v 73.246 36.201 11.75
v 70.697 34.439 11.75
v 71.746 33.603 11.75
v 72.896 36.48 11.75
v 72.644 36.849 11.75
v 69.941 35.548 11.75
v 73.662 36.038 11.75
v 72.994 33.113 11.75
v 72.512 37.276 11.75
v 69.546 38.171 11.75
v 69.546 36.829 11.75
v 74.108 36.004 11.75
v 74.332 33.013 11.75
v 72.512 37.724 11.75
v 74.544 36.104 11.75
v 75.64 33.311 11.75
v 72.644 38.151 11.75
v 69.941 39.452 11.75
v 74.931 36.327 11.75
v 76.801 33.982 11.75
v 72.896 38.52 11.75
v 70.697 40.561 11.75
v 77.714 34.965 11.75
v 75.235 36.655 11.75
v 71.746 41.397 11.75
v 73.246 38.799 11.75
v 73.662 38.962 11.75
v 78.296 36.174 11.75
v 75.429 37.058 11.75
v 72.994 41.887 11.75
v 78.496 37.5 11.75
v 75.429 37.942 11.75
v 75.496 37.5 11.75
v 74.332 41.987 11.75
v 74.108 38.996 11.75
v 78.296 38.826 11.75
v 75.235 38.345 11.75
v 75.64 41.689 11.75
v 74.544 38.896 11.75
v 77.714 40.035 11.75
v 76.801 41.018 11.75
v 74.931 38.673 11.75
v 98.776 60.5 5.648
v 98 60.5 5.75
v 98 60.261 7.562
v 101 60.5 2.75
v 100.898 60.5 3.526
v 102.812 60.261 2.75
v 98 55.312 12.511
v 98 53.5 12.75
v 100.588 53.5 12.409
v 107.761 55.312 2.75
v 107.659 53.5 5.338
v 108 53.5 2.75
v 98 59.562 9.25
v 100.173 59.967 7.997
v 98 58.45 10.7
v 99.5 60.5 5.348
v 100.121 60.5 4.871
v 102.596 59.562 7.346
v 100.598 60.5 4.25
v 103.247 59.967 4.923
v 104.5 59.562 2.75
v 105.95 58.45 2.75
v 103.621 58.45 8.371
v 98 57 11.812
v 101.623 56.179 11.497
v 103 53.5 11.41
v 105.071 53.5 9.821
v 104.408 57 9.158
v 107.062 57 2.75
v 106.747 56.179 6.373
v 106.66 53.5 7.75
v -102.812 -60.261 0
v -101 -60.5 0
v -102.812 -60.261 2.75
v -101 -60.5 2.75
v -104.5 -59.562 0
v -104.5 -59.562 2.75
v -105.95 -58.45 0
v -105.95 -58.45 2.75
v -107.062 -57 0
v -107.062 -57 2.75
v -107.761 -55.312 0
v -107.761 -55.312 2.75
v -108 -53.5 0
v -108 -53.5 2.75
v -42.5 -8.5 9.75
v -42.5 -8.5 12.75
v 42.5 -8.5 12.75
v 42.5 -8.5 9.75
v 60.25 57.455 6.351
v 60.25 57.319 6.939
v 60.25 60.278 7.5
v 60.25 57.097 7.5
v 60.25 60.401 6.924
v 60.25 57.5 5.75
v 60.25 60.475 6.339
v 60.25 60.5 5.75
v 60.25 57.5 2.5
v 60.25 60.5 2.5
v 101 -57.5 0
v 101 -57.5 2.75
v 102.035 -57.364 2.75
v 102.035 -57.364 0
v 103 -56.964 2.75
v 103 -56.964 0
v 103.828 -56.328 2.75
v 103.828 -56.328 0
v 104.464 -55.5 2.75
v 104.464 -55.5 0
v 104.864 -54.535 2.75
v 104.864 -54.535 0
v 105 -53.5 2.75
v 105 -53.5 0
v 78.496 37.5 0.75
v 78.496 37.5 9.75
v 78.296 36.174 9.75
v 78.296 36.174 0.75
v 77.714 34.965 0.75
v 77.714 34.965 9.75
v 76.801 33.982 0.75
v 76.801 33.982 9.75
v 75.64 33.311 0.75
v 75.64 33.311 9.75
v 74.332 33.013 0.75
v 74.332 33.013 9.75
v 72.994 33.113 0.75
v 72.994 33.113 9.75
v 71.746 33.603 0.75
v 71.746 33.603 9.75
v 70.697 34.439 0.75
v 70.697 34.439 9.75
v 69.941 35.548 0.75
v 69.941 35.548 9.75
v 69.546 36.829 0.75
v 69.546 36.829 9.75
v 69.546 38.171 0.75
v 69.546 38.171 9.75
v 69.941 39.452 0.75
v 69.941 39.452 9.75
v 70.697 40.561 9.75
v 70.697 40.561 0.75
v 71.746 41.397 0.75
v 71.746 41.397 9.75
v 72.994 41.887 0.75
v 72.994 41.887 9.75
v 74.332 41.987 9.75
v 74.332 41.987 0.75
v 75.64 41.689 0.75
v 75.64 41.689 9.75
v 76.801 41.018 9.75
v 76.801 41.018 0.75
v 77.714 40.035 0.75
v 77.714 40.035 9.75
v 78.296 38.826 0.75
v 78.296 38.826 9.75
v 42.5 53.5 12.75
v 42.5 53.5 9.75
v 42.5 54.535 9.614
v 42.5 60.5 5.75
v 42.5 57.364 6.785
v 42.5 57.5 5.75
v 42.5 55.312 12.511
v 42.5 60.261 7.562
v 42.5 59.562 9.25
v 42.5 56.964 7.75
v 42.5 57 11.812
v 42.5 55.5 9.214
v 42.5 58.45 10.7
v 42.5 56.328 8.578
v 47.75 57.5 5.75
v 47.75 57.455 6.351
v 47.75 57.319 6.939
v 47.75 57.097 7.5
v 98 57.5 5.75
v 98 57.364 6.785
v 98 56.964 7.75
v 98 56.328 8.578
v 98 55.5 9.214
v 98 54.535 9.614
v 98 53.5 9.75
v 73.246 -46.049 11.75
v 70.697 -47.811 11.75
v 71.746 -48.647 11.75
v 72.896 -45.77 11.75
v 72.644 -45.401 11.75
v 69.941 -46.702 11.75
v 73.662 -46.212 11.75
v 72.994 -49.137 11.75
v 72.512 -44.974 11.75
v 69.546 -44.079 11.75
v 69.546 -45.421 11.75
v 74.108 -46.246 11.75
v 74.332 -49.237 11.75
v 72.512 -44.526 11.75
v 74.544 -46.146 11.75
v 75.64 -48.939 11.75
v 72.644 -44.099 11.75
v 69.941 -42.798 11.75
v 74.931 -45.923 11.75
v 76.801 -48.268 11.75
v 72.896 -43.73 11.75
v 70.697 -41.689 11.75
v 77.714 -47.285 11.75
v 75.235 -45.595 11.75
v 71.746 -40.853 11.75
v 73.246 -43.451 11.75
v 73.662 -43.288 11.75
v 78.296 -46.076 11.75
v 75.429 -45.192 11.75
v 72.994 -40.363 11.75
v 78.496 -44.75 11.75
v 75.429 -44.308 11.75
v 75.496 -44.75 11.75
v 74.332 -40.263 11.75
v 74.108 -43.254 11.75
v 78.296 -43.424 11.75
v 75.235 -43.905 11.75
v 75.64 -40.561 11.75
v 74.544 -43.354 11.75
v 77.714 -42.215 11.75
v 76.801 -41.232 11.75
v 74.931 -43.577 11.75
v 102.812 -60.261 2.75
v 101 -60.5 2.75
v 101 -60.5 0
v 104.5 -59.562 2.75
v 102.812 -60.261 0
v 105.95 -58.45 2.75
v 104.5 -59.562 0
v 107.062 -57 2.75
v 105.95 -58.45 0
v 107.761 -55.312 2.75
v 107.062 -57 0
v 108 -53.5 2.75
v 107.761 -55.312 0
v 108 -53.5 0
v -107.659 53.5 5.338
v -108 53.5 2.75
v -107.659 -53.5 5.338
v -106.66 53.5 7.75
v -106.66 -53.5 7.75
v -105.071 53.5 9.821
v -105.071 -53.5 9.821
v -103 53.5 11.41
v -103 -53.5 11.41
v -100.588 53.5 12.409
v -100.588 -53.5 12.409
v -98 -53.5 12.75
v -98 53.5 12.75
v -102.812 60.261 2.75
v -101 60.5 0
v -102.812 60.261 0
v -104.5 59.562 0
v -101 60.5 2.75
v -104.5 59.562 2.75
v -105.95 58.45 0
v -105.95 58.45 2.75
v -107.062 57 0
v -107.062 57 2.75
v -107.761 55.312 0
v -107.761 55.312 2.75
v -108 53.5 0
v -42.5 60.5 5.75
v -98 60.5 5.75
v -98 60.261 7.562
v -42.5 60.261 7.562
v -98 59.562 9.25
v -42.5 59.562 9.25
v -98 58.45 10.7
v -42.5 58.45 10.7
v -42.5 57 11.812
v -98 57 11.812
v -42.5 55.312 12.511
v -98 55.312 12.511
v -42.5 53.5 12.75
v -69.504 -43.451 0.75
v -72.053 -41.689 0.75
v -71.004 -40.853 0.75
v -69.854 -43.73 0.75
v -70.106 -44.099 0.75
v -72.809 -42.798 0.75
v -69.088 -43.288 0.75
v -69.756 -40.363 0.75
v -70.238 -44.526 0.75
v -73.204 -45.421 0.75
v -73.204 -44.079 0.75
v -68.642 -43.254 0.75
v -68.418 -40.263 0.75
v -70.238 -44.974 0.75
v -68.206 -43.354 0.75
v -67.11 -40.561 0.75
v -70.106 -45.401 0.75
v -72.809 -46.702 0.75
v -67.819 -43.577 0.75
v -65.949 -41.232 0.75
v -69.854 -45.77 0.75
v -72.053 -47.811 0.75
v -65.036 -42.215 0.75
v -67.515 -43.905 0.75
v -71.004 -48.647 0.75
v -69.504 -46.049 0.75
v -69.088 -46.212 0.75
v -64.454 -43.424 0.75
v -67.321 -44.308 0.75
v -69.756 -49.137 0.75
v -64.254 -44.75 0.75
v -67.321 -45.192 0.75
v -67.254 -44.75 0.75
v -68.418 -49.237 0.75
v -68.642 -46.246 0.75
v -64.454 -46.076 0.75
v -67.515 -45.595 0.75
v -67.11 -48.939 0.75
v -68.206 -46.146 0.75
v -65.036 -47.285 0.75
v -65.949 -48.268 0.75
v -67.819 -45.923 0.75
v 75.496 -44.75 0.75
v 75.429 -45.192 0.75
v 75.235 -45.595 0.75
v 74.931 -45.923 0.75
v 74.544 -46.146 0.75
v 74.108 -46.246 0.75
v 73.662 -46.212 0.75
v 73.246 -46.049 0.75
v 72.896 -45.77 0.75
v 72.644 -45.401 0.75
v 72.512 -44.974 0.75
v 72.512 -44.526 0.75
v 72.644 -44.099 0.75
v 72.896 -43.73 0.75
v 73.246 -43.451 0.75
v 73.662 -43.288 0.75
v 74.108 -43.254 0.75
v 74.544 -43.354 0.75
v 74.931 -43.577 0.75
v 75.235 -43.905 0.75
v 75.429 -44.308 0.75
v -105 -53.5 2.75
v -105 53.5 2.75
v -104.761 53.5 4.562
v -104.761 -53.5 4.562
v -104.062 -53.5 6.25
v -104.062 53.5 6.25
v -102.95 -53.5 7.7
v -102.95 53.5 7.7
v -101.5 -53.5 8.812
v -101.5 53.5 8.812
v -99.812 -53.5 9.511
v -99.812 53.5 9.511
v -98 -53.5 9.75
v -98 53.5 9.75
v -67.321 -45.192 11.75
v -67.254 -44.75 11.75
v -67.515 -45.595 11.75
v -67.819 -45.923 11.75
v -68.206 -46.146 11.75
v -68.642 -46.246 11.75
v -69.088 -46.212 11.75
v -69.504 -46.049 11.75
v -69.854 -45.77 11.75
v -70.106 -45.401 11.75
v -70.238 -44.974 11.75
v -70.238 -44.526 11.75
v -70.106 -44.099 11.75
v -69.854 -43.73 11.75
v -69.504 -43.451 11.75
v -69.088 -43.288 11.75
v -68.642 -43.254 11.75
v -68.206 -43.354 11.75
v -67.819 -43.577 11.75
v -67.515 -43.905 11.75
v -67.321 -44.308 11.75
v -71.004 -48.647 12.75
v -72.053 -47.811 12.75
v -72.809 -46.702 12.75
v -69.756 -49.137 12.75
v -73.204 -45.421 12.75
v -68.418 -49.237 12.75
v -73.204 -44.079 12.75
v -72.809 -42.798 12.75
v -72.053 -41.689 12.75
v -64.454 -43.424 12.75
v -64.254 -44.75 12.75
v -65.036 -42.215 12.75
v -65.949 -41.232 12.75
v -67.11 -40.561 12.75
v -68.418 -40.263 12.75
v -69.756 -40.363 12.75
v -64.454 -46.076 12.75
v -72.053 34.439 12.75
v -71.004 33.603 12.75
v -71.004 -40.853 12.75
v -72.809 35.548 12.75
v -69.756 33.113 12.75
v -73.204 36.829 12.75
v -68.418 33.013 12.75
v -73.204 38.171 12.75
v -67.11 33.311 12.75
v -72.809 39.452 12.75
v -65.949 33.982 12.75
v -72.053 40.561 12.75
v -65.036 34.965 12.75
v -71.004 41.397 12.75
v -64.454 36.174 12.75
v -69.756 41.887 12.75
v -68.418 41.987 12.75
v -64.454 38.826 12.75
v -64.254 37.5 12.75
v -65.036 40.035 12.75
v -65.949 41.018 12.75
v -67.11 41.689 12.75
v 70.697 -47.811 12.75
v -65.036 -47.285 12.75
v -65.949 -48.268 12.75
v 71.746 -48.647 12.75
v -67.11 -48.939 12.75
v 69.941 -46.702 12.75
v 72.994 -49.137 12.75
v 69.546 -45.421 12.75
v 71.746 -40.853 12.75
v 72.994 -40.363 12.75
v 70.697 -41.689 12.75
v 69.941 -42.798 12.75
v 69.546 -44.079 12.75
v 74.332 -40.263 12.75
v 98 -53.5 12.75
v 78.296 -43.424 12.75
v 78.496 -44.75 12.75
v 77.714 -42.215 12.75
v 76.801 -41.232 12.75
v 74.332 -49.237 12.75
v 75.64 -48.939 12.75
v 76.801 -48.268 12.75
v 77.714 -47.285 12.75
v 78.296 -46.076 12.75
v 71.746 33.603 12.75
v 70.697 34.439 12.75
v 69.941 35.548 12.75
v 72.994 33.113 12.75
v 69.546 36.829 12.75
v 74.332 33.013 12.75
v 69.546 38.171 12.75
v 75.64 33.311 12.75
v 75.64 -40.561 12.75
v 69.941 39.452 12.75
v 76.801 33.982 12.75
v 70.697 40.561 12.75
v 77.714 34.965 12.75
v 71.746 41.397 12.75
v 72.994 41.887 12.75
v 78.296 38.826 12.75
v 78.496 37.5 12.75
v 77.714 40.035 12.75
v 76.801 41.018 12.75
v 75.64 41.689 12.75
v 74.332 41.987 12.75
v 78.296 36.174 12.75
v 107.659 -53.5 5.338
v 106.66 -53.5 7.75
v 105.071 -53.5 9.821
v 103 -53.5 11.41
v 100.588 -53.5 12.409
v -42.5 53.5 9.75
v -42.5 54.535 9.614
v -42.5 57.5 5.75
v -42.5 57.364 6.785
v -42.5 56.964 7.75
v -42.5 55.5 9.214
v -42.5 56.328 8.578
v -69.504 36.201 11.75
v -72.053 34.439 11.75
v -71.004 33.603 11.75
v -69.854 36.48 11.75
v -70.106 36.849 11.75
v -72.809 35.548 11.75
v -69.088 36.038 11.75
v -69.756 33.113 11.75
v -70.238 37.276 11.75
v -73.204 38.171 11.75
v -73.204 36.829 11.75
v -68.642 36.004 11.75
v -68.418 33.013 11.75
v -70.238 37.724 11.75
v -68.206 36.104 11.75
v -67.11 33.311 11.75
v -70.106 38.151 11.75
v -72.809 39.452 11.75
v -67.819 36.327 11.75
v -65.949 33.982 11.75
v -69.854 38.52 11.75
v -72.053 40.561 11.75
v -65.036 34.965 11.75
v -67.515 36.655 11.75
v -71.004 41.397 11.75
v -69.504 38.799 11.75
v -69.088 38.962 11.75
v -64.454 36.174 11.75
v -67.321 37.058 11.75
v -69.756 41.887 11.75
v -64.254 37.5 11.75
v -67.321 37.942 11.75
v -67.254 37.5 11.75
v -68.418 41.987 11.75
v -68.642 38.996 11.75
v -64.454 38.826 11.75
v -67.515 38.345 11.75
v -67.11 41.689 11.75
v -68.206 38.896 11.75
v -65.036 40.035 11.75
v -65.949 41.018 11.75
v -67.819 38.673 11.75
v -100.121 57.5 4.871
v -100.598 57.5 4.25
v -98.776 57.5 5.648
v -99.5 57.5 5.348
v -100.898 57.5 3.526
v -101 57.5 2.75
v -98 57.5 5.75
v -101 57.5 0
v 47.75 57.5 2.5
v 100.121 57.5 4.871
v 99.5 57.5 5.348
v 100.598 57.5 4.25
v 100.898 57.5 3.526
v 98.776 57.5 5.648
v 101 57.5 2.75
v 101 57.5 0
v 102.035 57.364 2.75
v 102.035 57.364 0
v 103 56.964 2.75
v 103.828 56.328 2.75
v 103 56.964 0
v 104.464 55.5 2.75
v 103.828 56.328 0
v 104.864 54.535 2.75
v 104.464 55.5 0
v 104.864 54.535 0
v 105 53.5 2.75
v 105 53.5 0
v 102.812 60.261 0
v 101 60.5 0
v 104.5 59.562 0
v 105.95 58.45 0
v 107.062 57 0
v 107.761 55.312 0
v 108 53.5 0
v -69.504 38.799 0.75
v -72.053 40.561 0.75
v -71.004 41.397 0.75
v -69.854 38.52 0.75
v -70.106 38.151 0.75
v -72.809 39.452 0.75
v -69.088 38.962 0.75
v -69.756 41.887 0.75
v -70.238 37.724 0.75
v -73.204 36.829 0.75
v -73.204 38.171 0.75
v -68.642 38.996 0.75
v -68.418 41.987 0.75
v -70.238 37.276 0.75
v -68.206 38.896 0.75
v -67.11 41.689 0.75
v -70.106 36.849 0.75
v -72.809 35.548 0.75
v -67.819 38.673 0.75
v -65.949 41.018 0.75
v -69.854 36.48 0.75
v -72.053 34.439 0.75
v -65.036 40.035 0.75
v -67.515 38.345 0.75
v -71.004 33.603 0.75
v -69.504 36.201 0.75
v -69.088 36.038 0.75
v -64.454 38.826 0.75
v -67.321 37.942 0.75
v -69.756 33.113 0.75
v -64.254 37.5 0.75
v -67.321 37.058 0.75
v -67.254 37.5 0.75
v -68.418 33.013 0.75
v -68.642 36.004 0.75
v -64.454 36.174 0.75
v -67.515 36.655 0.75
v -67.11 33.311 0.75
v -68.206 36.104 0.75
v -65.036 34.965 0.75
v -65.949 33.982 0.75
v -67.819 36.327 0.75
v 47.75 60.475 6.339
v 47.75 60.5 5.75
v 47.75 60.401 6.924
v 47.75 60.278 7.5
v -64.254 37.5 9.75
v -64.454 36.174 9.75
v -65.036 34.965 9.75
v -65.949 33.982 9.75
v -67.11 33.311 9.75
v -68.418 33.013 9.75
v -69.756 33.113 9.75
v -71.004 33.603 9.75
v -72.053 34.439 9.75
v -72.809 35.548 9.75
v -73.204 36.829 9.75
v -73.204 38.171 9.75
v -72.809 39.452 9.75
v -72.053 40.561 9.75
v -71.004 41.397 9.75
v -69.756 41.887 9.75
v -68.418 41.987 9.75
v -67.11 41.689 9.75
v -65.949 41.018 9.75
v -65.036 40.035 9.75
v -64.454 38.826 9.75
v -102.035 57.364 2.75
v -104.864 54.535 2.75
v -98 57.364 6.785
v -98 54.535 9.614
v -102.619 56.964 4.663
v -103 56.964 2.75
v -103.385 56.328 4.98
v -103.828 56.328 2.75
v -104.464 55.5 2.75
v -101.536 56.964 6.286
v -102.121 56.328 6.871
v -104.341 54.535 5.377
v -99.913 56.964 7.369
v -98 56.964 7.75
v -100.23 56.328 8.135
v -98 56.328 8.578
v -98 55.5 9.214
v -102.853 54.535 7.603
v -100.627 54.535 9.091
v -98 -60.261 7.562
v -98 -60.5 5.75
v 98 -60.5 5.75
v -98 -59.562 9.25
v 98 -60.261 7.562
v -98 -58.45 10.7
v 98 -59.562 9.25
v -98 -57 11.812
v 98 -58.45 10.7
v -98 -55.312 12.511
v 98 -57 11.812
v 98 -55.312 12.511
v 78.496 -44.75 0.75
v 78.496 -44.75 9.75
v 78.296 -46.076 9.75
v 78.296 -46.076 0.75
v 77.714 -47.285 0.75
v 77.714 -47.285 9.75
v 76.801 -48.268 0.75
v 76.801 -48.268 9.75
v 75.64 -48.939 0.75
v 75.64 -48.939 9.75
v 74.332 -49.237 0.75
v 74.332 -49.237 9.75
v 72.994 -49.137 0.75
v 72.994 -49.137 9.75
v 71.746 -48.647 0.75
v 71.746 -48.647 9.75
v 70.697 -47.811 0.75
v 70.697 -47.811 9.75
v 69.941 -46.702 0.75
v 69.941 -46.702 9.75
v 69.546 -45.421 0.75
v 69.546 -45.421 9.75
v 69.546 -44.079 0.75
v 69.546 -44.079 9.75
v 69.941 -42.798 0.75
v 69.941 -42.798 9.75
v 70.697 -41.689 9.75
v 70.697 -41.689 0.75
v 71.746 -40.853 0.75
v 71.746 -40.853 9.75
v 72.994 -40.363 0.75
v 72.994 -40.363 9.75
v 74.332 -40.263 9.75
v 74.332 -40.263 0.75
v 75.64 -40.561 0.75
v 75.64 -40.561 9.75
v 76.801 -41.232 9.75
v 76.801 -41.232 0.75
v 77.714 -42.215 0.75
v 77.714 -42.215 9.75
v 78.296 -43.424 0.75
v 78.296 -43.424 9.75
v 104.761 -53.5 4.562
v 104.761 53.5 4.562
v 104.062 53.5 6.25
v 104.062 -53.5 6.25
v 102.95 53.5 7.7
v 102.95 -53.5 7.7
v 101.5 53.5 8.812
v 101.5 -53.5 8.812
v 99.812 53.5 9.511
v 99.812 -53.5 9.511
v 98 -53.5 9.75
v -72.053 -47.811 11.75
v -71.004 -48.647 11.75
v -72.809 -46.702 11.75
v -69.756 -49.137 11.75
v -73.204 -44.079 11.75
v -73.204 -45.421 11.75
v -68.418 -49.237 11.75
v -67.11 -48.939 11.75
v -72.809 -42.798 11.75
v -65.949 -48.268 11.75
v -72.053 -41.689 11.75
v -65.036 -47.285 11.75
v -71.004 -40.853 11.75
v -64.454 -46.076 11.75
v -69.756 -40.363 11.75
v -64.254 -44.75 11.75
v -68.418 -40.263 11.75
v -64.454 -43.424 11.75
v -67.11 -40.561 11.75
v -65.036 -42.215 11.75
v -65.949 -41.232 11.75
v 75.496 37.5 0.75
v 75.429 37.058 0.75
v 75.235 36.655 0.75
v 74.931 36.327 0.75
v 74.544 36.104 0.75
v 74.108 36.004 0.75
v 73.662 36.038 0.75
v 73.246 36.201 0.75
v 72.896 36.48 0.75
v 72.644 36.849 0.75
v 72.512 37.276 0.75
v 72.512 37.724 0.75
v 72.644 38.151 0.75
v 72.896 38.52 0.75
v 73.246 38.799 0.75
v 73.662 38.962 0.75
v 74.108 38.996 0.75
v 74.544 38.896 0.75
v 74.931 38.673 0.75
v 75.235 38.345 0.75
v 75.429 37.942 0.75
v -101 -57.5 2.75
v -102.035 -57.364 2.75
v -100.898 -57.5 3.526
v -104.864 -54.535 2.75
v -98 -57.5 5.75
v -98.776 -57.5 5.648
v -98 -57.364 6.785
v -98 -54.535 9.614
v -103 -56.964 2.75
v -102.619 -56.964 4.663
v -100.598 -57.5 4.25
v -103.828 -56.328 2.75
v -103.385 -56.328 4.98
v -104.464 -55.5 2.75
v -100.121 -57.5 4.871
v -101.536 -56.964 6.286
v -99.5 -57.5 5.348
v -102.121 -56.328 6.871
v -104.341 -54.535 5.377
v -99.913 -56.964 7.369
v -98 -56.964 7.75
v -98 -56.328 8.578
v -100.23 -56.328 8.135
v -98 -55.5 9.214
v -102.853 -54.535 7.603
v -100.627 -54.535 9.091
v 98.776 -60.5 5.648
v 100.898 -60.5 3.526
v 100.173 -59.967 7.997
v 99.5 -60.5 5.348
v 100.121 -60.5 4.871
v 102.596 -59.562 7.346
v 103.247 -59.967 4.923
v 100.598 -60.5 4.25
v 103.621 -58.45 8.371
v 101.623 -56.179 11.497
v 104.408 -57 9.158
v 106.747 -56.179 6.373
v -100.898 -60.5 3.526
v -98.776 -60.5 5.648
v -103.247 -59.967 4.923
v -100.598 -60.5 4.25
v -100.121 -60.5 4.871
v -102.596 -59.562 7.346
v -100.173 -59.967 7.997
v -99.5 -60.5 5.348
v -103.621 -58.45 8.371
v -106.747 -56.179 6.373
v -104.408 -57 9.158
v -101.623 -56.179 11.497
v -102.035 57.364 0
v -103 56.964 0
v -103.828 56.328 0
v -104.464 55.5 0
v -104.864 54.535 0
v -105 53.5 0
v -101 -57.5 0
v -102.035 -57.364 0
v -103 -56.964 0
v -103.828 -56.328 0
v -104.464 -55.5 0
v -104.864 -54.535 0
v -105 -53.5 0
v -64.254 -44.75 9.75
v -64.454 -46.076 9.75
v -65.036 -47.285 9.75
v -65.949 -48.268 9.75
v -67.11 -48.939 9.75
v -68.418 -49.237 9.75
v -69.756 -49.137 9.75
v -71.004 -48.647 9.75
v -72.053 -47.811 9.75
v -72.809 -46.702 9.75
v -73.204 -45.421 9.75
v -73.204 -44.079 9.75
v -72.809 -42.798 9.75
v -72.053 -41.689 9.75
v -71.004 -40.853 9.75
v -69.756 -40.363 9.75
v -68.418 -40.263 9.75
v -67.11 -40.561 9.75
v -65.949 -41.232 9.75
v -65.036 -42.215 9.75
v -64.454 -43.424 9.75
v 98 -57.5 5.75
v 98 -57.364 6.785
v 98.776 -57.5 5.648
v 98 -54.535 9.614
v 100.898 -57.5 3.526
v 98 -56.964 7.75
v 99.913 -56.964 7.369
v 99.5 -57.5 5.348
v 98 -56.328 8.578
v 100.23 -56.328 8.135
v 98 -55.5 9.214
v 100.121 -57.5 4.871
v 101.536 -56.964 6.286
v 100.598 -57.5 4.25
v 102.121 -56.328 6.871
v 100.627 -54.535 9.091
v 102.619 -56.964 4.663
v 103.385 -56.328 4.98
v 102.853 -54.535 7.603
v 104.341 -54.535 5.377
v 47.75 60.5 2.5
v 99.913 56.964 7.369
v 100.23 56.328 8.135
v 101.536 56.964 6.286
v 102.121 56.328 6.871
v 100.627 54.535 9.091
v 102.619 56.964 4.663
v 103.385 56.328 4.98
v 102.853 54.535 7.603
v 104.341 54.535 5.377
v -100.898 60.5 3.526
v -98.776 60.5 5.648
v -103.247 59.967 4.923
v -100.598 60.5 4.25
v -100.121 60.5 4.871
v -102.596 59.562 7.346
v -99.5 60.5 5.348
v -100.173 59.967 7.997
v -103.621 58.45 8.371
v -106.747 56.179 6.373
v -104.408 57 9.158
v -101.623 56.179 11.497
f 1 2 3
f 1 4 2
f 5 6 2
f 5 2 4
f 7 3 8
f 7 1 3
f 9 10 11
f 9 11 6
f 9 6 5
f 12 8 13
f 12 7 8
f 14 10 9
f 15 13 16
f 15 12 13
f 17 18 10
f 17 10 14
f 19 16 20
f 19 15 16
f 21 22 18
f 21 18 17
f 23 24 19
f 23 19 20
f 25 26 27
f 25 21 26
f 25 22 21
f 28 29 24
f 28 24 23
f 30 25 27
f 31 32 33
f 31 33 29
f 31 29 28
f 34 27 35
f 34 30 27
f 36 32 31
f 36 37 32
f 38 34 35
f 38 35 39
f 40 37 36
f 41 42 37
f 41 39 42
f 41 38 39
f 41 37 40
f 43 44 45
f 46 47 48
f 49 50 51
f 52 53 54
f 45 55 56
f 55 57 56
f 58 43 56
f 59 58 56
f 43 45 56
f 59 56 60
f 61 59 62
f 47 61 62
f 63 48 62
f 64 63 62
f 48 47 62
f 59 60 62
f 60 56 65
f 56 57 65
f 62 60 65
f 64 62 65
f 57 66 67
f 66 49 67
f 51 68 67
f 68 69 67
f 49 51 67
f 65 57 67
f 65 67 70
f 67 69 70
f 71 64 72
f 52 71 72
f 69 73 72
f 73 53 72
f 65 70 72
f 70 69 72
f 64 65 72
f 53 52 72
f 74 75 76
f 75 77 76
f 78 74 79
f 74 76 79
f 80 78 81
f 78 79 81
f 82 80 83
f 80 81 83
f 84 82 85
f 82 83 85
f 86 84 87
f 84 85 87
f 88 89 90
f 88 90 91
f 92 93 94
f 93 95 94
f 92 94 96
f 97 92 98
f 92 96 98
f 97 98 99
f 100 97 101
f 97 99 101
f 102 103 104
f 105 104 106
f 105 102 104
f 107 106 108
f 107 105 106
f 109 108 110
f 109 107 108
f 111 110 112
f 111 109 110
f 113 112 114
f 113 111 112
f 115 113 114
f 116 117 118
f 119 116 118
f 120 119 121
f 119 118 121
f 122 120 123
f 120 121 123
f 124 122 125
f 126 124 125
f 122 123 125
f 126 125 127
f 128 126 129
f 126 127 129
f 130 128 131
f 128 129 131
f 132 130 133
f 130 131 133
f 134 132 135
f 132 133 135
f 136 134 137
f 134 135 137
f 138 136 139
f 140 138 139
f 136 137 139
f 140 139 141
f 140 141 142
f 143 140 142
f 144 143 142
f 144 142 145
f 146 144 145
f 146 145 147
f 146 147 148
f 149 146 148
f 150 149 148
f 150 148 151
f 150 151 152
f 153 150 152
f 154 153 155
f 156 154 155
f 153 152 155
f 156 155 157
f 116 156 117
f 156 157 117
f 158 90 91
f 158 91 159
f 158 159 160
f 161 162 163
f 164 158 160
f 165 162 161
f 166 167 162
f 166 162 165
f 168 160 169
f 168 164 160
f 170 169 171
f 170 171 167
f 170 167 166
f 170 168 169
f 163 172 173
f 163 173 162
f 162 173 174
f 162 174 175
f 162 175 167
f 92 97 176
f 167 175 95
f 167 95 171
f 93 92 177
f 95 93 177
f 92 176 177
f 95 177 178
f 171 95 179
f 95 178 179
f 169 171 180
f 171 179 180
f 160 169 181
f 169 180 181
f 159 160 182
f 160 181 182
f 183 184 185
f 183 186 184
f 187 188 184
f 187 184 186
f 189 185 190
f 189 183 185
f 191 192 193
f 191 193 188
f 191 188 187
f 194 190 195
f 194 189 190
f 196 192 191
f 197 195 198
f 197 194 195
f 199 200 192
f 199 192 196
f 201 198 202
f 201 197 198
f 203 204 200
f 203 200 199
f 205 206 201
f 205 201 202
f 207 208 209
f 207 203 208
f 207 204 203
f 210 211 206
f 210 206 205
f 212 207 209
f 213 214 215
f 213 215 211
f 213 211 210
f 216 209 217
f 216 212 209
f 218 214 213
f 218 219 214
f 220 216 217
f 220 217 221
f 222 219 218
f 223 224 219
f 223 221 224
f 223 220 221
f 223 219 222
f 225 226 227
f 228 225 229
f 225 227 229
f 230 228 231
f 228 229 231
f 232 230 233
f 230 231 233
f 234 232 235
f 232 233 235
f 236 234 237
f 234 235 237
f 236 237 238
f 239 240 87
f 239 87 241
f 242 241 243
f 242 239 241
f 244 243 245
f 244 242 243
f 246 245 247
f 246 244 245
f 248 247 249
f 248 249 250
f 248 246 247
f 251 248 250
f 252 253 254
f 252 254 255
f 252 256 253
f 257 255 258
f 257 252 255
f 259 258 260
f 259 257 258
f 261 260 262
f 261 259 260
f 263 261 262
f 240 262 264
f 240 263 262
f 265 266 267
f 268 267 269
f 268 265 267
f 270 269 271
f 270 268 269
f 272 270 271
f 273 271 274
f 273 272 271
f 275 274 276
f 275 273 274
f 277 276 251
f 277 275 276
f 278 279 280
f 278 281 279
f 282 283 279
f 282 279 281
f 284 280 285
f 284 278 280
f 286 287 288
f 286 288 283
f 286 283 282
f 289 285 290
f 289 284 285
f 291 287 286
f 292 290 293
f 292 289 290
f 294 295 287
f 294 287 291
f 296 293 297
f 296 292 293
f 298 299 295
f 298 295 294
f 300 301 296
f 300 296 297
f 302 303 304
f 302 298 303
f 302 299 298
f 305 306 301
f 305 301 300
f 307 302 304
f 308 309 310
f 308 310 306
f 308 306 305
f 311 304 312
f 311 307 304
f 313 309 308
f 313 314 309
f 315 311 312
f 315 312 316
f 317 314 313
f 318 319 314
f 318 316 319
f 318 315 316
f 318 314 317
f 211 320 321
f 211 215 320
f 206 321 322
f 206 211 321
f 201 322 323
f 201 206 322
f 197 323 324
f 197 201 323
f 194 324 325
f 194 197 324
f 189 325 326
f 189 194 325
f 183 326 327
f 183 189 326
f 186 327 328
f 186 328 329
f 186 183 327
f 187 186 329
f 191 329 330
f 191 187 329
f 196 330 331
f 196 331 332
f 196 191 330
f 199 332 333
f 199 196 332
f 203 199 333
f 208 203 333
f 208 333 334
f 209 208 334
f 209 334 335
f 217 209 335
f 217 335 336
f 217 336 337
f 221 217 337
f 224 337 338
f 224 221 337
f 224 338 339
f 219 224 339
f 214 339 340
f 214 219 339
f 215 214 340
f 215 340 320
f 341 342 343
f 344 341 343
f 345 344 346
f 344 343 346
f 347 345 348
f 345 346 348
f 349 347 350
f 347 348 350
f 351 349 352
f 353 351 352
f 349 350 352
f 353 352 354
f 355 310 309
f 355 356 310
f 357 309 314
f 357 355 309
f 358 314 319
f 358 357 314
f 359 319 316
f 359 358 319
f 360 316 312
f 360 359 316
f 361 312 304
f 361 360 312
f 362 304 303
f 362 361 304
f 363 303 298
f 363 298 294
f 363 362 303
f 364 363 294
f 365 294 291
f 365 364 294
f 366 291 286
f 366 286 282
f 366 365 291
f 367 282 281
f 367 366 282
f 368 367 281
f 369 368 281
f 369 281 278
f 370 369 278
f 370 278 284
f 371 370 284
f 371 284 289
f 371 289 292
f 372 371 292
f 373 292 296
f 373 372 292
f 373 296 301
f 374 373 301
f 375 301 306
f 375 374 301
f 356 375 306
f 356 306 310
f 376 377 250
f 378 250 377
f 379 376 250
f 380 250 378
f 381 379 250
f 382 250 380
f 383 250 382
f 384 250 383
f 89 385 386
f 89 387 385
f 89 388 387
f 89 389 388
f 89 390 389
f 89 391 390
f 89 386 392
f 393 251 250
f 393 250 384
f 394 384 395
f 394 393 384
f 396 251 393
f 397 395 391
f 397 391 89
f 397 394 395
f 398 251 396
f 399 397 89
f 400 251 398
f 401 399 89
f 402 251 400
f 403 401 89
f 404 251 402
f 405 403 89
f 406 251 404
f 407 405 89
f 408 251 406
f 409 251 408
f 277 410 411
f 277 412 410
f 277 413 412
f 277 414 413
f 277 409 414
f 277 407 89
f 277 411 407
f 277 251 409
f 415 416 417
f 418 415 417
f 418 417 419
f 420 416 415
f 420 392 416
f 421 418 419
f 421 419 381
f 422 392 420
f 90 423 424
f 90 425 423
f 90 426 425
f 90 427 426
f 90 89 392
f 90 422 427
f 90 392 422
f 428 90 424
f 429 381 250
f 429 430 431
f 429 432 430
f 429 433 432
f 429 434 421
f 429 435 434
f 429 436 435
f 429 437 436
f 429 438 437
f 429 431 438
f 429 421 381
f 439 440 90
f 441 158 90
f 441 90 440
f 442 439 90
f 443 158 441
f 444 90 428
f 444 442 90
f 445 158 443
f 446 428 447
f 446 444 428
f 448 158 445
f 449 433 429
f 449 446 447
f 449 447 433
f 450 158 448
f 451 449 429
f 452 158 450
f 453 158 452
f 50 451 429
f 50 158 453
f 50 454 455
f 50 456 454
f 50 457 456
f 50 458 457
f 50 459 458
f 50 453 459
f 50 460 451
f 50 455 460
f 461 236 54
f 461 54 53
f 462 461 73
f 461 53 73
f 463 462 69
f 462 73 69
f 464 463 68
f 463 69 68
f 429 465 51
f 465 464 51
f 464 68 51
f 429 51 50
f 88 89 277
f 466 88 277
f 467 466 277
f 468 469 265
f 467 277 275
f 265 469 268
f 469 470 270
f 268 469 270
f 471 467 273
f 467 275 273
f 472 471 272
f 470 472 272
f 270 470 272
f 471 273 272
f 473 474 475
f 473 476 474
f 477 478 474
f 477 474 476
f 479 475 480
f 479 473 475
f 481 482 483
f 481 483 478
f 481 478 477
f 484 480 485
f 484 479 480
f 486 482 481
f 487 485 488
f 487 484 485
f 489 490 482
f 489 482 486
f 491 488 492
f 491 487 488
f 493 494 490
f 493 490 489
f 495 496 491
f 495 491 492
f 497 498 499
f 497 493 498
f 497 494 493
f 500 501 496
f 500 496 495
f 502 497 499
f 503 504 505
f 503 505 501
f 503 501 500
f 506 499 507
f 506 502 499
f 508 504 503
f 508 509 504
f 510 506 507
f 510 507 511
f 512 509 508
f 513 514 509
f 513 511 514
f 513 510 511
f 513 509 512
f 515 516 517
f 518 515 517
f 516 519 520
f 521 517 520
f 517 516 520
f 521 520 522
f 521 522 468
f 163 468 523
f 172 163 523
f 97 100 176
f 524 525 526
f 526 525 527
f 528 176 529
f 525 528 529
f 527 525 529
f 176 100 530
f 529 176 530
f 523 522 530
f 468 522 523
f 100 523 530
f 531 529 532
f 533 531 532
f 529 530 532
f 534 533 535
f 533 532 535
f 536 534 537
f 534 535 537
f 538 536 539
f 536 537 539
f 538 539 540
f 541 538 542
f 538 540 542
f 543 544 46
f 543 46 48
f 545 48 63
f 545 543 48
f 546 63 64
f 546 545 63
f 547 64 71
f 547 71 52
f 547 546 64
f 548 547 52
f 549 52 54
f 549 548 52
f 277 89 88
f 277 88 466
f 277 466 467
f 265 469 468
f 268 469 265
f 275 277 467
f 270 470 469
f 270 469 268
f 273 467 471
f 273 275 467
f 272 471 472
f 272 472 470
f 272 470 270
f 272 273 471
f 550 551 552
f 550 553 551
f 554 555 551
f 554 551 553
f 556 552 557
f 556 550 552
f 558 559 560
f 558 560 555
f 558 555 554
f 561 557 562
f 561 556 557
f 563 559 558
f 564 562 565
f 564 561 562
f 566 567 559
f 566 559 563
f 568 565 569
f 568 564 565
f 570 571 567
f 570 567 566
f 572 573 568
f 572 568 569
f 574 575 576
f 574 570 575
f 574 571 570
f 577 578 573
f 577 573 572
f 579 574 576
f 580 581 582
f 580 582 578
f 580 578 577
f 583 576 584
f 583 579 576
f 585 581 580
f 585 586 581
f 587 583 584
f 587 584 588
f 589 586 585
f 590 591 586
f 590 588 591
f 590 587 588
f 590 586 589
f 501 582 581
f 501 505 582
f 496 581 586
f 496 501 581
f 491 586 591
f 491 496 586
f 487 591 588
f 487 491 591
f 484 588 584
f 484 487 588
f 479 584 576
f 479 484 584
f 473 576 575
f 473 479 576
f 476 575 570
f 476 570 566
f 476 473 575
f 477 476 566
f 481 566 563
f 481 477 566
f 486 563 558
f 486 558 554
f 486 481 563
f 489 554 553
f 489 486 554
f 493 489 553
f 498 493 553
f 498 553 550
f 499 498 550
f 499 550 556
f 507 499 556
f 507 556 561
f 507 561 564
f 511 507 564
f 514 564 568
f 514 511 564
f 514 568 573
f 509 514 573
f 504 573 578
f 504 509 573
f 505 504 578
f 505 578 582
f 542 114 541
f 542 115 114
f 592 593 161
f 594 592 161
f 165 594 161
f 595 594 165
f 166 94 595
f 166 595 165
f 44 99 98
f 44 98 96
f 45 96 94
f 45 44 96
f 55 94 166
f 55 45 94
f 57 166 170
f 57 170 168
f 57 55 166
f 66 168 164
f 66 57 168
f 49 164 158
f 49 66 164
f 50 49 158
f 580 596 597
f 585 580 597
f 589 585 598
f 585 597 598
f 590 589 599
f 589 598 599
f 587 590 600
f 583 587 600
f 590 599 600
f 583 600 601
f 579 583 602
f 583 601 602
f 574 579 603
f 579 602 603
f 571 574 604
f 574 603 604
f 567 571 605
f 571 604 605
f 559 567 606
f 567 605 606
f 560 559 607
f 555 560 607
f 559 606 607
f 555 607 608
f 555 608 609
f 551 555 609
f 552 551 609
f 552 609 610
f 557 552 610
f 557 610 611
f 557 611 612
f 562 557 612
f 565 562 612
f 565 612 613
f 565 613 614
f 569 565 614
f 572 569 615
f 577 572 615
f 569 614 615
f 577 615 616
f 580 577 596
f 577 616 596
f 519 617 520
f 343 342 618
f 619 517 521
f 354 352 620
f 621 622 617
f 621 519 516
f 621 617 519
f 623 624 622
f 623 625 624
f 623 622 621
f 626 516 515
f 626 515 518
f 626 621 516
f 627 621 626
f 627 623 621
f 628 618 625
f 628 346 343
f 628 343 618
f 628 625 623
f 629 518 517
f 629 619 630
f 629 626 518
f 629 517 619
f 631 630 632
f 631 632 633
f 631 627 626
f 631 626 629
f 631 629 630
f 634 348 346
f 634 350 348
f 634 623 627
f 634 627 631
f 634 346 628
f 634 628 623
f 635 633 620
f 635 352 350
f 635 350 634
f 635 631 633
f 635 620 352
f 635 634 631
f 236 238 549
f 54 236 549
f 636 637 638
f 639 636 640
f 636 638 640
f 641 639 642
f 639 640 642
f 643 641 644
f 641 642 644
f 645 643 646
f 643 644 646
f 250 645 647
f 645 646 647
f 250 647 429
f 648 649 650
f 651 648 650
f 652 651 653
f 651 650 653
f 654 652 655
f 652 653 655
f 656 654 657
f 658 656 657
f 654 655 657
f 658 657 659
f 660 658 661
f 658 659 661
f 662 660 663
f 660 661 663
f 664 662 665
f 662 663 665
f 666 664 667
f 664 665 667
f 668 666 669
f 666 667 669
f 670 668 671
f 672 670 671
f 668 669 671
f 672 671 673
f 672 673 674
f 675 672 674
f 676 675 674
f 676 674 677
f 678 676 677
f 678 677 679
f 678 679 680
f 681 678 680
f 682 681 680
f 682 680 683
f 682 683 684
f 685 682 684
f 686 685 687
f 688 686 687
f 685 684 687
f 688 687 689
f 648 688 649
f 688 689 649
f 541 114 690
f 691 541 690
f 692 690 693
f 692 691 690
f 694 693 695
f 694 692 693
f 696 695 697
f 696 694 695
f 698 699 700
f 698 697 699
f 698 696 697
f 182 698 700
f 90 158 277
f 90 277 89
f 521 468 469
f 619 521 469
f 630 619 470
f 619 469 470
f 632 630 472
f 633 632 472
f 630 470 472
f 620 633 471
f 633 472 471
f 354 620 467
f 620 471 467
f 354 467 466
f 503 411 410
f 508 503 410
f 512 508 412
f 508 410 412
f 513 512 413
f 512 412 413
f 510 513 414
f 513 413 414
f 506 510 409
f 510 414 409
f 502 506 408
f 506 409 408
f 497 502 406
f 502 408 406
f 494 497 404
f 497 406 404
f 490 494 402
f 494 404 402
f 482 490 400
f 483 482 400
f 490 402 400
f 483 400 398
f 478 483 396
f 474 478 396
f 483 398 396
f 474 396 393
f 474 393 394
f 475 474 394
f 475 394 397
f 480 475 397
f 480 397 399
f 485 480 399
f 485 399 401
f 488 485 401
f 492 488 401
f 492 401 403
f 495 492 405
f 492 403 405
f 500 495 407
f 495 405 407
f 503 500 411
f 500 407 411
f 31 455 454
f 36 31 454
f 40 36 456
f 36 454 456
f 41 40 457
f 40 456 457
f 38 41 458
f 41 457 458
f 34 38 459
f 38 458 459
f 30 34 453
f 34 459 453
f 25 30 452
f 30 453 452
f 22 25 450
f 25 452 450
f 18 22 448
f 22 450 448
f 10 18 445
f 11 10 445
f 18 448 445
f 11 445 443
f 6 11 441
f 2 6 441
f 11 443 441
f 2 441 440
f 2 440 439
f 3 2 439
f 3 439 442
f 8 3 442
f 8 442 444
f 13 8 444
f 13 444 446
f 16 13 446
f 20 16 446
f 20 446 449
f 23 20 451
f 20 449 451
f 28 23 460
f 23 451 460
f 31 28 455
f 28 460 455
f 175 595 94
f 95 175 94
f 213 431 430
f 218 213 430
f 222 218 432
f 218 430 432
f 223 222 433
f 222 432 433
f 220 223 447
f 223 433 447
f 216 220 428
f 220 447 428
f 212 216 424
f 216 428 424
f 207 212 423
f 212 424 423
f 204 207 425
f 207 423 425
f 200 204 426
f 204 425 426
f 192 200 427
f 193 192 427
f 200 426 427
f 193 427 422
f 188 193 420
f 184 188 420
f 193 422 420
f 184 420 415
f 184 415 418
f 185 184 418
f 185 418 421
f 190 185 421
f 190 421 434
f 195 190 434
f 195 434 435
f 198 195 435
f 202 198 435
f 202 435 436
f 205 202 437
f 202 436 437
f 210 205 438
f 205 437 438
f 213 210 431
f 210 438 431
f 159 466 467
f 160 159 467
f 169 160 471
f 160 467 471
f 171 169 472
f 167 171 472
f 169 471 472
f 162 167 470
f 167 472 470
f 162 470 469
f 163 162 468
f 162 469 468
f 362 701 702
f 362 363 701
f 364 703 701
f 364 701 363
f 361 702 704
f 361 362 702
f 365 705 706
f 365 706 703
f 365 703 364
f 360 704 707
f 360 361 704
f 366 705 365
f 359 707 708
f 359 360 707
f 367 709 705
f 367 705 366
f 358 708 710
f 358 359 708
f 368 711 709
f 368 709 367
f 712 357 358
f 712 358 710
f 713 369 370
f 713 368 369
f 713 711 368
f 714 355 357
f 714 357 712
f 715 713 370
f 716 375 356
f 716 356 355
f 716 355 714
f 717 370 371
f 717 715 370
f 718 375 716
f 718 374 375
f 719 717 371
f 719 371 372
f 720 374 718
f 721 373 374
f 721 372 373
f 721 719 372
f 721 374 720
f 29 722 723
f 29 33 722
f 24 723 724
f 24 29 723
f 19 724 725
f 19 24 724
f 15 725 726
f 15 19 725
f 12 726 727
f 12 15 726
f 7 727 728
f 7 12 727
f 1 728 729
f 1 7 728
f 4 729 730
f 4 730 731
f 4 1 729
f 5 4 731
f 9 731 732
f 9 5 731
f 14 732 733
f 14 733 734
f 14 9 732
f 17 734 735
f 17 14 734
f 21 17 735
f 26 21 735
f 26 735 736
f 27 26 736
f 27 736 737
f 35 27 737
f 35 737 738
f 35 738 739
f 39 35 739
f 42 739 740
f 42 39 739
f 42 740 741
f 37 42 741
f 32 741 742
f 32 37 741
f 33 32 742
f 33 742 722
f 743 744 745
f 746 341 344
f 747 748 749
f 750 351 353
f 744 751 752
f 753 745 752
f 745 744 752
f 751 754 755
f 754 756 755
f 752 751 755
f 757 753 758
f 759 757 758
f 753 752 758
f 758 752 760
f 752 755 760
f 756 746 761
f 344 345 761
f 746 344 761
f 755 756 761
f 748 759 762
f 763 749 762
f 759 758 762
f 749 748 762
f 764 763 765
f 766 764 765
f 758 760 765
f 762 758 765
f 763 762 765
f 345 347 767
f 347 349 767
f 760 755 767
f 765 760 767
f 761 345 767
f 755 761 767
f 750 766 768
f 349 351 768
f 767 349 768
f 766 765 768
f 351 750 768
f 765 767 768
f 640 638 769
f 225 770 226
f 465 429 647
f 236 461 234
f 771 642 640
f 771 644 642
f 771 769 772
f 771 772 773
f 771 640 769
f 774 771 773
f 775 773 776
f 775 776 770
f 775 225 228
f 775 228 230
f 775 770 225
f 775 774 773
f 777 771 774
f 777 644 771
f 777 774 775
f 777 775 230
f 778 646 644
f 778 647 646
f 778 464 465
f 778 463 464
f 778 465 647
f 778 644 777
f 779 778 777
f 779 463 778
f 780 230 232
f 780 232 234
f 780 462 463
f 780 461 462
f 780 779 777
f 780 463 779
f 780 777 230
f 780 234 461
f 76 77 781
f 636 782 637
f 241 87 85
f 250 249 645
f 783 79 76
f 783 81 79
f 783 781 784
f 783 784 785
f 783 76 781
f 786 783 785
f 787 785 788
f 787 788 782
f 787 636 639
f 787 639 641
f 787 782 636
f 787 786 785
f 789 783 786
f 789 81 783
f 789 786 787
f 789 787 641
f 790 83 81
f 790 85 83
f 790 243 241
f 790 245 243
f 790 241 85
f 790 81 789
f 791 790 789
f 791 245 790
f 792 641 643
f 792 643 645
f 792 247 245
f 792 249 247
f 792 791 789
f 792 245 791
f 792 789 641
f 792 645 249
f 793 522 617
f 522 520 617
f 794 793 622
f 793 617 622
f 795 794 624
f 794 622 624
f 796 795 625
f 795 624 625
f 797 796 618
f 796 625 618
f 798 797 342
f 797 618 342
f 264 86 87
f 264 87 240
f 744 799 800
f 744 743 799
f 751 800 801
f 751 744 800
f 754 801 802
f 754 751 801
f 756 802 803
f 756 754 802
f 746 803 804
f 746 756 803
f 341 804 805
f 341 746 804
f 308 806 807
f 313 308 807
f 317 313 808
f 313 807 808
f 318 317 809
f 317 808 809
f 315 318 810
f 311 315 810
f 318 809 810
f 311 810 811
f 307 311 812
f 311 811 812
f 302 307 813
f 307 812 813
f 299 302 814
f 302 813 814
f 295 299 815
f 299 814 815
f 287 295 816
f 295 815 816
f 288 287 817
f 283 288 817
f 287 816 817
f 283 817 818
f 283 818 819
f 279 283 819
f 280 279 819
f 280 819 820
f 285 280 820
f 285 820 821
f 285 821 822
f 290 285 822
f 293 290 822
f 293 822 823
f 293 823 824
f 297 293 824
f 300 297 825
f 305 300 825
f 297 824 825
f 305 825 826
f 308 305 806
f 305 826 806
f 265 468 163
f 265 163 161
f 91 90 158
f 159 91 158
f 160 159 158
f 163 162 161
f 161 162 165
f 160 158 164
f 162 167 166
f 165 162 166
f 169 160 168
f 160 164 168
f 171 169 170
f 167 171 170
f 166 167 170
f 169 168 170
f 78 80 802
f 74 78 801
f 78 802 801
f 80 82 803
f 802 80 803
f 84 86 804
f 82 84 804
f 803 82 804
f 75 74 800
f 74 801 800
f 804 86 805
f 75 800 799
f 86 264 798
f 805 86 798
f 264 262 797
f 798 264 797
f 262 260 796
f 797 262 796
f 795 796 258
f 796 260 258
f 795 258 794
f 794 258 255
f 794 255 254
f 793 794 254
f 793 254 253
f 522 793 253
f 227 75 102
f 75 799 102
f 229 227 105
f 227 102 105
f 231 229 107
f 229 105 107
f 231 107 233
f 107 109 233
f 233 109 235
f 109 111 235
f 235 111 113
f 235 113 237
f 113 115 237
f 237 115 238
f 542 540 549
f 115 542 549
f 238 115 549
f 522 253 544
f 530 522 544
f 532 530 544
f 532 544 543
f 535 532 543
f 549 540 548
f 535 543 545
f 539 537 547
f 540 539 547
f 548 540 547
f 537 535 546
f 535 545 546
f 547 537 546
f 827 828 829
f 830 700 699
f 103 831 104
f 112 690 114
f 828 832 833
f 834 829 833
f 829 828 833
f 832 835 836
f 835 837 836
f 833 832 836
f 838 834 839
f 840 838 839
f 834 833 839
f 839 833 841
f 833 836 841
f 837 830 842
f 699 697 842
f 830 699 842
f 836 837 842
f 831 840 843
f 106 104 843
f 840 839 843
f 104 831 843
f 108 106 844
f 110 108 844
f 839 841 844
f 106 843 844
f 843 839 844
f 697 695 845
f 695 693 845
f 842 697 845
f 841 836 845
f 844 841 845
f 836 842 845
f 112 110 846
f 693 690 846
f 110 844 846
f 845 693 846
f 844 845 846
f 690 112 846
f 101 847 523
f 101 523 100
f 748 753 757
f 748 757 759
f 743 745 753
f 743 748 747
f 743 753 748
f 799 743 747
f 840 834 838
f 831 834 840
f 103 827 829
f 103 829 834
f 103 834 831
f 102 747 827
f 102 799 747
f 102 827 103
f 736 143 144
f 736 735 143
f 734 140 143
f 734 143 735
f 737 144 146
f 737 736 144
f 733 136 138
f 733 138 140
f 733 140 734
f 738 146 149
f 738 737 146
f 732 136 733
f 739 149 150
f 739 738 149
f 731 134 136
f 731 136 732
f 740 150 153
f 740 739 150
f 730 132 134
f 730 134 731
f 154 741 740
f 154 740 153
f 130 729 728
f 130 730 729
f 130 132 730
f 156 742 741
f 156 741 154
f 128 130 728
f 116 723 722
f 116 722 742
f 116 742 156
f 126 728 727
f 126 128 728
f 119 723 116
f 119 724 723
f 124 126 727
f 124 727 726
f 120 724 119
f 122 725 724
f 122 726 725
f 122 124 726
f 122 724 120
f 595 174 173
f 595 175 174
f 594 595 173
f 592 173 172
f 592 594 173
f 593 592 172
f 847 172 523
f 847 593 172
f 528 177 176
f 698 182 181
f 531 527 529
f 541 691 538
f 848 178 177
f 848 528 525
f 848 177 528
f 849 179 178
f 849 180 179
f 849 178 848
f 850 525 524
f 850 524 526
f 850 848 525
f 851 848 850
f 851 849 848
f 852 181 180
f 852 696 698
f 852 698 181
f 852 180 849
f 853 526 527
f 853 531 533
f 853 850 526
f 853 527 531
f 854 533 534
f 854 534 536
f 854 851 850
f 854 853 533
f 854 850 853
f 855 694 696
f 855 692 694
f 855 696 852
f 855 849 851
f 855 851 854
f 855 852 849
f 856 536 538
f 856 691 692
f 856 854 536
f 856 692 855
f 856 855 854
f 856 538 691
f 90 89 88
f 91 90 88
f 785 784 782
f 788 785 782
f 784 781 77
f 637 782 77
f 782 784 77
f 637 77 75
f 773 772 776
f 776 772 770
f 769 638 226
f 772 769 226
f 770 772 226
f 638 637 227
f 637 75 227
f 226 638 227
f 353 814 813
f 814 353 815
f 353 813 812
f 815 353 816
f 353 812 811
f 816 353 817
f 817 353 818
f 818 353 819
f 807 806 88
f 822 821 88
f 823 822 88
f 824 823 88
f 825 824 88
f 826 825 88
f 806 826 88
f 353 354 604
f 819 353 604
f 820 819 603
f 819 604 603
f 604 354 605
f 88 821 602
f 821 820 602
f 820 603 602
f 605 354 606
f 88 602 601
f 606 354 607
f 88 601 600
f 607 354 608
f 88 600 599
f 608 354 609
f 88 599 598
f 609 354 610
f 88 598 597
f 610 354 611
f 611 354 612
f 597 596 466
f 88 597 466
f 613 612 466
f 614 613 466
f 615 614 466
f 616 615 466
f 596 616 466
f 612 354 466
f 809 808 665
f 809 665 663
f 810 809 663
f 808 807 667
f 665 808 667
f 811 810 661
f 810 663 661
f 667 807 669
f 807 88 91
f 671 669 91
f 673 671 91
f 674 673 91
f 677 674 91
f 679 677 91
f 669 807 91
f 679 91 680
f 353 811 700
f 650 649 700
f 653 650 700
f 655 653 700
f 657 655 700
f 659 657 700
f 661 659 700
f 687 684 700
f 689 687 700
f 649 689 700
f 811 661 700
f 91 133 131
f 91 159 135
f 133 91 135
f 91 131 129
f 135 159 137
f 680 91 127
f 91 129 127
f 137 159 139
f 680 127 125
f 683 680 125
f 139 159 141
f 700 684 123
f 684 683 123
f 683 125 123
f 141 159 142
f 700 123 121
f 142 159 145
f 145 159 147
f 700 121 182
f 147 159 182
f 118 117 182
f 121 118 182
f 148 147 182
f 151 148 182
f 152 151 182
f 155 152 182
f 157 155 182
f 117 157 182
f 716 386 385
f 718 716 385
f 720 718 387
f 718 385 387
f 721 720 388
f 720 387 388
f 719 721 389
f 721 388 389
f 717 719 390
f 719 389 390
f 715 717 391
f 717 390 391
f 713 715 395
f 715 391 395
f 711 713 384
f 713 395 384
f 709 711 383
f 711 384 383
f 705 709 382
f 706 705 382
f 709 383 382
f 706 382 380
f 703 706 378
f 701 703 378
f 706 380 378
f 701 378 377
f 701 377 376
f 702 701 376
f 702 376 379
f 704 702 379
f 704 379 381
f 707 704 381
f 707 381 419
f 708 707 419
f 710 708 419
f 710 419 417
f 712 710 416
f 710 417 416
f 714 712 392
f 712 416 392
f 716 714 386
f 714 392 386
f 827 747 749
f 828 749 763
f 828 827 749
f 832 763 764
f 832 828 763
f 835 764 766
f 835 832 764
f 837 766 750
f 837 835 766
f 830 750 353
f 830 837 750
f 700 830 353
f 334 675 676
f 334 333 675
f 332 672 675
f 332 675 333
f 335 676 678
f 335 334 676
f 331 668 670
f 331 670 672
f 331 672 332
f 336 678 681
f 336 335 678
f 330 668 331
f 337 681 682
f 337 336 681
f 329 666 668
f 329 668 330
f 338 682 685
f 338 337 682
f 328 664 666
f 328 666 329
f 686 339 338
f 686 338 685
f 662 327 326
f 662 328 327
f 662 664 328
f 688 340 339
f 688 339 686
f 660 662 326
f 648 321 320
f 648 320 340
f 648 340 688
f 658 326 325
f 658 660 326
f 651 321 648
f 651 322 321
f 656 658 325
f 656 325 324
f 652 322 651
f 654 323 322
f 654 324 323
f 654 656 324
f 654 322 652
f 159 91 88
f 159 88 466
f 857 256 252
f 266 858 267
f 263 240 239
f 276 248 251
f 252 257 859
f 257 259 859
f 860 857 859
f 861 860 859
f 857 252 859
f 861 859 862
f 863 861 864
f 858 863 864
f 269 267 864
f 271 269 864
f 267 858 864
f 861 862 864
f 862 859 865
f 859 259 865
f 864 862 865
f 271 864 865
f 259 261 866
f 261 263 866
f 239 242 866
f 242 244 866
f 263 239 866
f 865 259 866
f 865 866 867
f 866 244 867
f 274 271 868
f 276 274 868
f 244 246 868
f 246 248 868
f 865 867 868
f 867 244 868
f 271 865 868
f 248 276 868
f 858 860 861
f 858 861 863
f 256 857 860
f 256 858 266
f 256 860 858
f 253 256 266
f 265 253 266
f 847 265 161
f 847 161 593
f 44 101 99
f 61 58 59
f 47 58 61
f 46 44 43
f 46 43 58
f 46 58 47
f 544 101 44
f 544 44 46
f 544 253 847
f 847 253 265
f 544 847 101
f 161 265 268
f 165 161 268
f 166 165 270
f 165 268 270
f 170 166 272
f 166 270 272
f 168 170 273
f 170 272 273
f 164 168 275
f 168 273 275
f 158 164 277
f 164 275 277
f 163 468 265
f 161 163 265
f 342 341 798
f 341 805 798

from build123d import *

# Parameters (mm, degrees)
SKETCH_1_W             = 210
SKETCH_1_H             = 115
EXTRUDE_6_DEPTH        = 9.75
FILLET_6_R             = 7
FILLET_7_R             = 4
SHELL_6_T              = 3
SKETCH_17_R            = 4.5
SKETCH_17_R_2          = 1.5
CUT_EXTRUDE_2_DEPTH    = 1
SKETCH_20_R            = 1.5
CUT_EXTRUDE_3_DEPTH    = 125.446022435
SKETCH_12_R            = 4.5
SKETCH_12_R_2          = 1.5
EXTRUDE_12_DEPTH       = 9
SKETCH_21_W            = 12.5
SKETCH_21_H            = 5
CUT_EXTRUDE_4_DEPTH    = 10
SPLIT_START            = -42.5
SPLIT_BODIES_4_DEPTH   = 85
SPLIT_BODIES_4_2_DEPTH = 85


# Read off the part's stored shape, not the designer's step: Разделить4
with BuildPart() as part:
    # Эскиз1 → Бобышка-Вытянуть6 (new body)
    with BuildSketch(Plane.XY):
        Rectangle(SKETCH_1_W, SKETCH_1_H)
    extrude(amount=EXTRUDE_6_DEPTH)

    # Скругление6
    fillet_6_edges = [part.edges().sort_by_distance(p)[0] for p in [
        (105, 0, 9.75),
        (-105, 0, 9.75),
    ]]
    fillet(fillet_6_edges, radius=FILLET_6_R)

    # Скругление7
    fillet_7_edges = [part.edges().sort_by_distance(p)[0] for p in [
        (0, -57.5, 9.75),
        (0, 57.5, 9.75),
        (-105, 57.5, 1.375),
        (105, 57.5, 1.375),
        (-102.949747468, 57.5, 7.699747468),
        (102.949747468, 57.5, 7.699747468),
        (105, -57.5, 1.375),
        (-105, -57.5, 1.375),
        (-102.949747468, -57.5, 7.699747468),
        (102.949747468, -57.5, 7.699747468),
    ]]
    fillet(fillet_7_edges, radius=FILLET_7_R)

    # Оболочка6
    shell_6_openings = [part.faces().sort_by_distance(p)[0] for p in [
        (0, 0, 0),
    ]]
    offset(amount=SHELL_6_T, openings=shell_6_openings, kind=Kind.INTERSECTION)

    # Эскиз17 → Вырез-Вытянуть2 (cut)
    # profile 1 of 4: a face of its own
    with BuildSketch(Plane.XY.offset(12.75)):
        with Locations((73.99553429, 37.5)):
            Circle(SKETCH_17_R)
        with Locations((73.99553429, 37.5)):
            Circle(SKETCH_17_R_2, mode=Mode.SUBTRACT)
    # profile 2 of 4: a face of its own
    with BuildSketch(Plane.XY.offset(12.75)):
        with Locations((-68.75446571, 37.5)):
            Circle(SKETCH_17_R)
        with Locations((-68.75446571, 37.5)):
            Circle(SKETCH_17_R_2, mode=Mode.SUBTRACT)
    # profile 3 of 4: a face of its own
    with BuildSketch(Plane.XY.offset(12.75)):
        with Locations((73.99553429, -44.75)):
            Circle(SKETCH_17_R)
        with Locations((73.99553429, -44.75)):
            Circle(SKETCH_17_R_2, mode=Mode.SUBTRACT)
    # profile 4 of 4: a face of its own
    with BuildSketch(Plane.XY.offset(12.75)):
        with Locations((-68.75446571, -44.75)):
            Circle(SKETCH_17_R)
        with Locations((-68.75446571, -44.75)):
            Circle(SKETCH_17_R_2, mode=Mode.SUBTRACT)
    extrude(amount=-CUT_EXTRUDE_2_DEPTH, mode=Mode.SUBTRACT)

    # Эскиз20 → Вырез-Вытянуть3 (cut, through all)
    with BuildSketch(Plane.XY.offset(12.75)):
        with Locations((-68.75446571, 37.5)):
            Circle(SKETCH_20_R)
        with Locations((73.99553429, 37.5)):
            Circle(SKETCH_20_R)
        with Locations((73.99553429, -44.75)):
            Circle(SKETCH_20_R)
        with Locations((-68.75446571, -44.75)):
            Circle(SKETCH_20_R)
    extrude(amount=-CUT_EXTRUDE_3_DEPTH, mode=Mode.SUBTRACT)

    # Эскиз12 → Бобышка-Вытянуть12 (add)
    # profile 1 of 4: a face of its own
    with BuildSketch(Plane(origin=(0, 0, 9.75), x_dir=(-1, 0, 0), z_dir=(0, 0, -1))):
        with Locations(Location((68.75446571, 37.5, 0), (0, 0, 180))):
            Circle(SKETCH_12_R)
        with Locations(Location((68.75446571, 37.5, 0), (0, 0, 180))):
            Circle(SKETCH_12_R_2, mode=Mode.SUBTRACT)
    # profile 2 of 4: a face of its own
    with BuildSketch(Plane(origin=(0, 0, 9.75), x_dir=(-1, 0, 0), z_dir=(0, 0, -1))):
        with Locations(Location((-73.99553429, 37.5, 0), (0, 0, 180))):
            Circle(SKETCH_12_R)
        with Locations(Location((-73.99553429, 37.5, 0), (0, 0, 180))):
            Circle(SKETCH_12_R_2, mode=Mode.SUBTRACT)
    # profile 3 of 4: a face of its own
    with BuildSketch(Plane(origin=(0, 0, 9.75), x_dir=(-1, 0, 0), z_dir=(0, 0, -1))):
        with Locations(Location((68.75446571, -44.75, 0), (0, 0, 180))):
            Circle(SKETCH_12_R)
        with Locations(Location((68.75446571, -44.75, 0), (0, 0, 180))):
            Circle(SKETCH_12_R_2, mode=Mode.SUBTRACT)
    # profile 4 of 4: a face of its own
    with BuildSketch(Plane(origin=(0, 0, 9.75), x_dir=(-1, 0, 0), z_dir=(0, 0, -1))):
        with Locations(Location((-73.99553429, -44.75, 0), (0, 0, 180))):
            Circle(SKETCH_12_R)
        with Locations(Location((-73.99553429, -44.75, 0), (0, 0, 180))):
            Circle(SKETCH_12_R_2, mode=Mode.SUBTRACT)
    extrude(amount=EXTRUDE_12_DEPTH)

    # Эскиз21 → Вырез-Вытянуть4 (cut)
    with BuildSketch(Plane(origin=(0, 60.5, 0), x_dir=(1, 0, 0), z_dir=(0, 1, 0))):
        with Locations((54, -5)):
            Rectangle(SKETCH_21_W, SKETCH_21_H)
    extrude(amount=-CUT_EXTRUDE_4_DEPTH, mode=Mode.SUBTRACT)

    # Split Bodies 4 2 outline → Split Bodies 4 2 (cut)
    with BuildSketch(Plane.YZ.offset(SPLIT_START)):
        with BuildLine():
            Line((-8.5, 12.75), (-8.5, 9.75))
            Line((-8.5, 9.75), (53.5, 9.75))
            ThreePointArc((53.5, 9.75), (56.328427125, 8.578427125), (57.5, 5.75))
            Line((57.5, 5.75), (60.5, 5.75))
            ThreePointArc((60.5, 5.75), (58.449747468, 10.699747468), (53.5, 12.75))
            Line((53.5, 12.75), (-8.5, 12.75))
        make_face()
    extrude(amount=SPLIT_BODIES_4_2_DEPTH, mode=Mode.SUBTRACT)


with BuildPart() as body_2:
    # Split Bodies 4 outline → Split Bodies 4 (new body)
    with BuildSketch(Plane.YZ.offset(SPLIT_START)):
        with BuildLine():
            Line((57.5, 5.75), (60.5, 5.75))
            ThreePointArc((60.5, 5.75), (58.449747468, 10.699747468), (53.5, 12.75))
            Line((53.5, 12.75), (-8.5, 12.75))
            Line((-8.5, 12.75), (-8.5, 9.75))
            Line((-8.5, 9.75), (53.5, 9.75))
            ThreePointArc((53.5, 9.75), (56.328427125, 8.578427125), (57.5, 5.75))
        make_face()
    extrude(amount=SPLIT_BODIES_4_DEPTH)


solid = Compound([part.part, body_2.part])
